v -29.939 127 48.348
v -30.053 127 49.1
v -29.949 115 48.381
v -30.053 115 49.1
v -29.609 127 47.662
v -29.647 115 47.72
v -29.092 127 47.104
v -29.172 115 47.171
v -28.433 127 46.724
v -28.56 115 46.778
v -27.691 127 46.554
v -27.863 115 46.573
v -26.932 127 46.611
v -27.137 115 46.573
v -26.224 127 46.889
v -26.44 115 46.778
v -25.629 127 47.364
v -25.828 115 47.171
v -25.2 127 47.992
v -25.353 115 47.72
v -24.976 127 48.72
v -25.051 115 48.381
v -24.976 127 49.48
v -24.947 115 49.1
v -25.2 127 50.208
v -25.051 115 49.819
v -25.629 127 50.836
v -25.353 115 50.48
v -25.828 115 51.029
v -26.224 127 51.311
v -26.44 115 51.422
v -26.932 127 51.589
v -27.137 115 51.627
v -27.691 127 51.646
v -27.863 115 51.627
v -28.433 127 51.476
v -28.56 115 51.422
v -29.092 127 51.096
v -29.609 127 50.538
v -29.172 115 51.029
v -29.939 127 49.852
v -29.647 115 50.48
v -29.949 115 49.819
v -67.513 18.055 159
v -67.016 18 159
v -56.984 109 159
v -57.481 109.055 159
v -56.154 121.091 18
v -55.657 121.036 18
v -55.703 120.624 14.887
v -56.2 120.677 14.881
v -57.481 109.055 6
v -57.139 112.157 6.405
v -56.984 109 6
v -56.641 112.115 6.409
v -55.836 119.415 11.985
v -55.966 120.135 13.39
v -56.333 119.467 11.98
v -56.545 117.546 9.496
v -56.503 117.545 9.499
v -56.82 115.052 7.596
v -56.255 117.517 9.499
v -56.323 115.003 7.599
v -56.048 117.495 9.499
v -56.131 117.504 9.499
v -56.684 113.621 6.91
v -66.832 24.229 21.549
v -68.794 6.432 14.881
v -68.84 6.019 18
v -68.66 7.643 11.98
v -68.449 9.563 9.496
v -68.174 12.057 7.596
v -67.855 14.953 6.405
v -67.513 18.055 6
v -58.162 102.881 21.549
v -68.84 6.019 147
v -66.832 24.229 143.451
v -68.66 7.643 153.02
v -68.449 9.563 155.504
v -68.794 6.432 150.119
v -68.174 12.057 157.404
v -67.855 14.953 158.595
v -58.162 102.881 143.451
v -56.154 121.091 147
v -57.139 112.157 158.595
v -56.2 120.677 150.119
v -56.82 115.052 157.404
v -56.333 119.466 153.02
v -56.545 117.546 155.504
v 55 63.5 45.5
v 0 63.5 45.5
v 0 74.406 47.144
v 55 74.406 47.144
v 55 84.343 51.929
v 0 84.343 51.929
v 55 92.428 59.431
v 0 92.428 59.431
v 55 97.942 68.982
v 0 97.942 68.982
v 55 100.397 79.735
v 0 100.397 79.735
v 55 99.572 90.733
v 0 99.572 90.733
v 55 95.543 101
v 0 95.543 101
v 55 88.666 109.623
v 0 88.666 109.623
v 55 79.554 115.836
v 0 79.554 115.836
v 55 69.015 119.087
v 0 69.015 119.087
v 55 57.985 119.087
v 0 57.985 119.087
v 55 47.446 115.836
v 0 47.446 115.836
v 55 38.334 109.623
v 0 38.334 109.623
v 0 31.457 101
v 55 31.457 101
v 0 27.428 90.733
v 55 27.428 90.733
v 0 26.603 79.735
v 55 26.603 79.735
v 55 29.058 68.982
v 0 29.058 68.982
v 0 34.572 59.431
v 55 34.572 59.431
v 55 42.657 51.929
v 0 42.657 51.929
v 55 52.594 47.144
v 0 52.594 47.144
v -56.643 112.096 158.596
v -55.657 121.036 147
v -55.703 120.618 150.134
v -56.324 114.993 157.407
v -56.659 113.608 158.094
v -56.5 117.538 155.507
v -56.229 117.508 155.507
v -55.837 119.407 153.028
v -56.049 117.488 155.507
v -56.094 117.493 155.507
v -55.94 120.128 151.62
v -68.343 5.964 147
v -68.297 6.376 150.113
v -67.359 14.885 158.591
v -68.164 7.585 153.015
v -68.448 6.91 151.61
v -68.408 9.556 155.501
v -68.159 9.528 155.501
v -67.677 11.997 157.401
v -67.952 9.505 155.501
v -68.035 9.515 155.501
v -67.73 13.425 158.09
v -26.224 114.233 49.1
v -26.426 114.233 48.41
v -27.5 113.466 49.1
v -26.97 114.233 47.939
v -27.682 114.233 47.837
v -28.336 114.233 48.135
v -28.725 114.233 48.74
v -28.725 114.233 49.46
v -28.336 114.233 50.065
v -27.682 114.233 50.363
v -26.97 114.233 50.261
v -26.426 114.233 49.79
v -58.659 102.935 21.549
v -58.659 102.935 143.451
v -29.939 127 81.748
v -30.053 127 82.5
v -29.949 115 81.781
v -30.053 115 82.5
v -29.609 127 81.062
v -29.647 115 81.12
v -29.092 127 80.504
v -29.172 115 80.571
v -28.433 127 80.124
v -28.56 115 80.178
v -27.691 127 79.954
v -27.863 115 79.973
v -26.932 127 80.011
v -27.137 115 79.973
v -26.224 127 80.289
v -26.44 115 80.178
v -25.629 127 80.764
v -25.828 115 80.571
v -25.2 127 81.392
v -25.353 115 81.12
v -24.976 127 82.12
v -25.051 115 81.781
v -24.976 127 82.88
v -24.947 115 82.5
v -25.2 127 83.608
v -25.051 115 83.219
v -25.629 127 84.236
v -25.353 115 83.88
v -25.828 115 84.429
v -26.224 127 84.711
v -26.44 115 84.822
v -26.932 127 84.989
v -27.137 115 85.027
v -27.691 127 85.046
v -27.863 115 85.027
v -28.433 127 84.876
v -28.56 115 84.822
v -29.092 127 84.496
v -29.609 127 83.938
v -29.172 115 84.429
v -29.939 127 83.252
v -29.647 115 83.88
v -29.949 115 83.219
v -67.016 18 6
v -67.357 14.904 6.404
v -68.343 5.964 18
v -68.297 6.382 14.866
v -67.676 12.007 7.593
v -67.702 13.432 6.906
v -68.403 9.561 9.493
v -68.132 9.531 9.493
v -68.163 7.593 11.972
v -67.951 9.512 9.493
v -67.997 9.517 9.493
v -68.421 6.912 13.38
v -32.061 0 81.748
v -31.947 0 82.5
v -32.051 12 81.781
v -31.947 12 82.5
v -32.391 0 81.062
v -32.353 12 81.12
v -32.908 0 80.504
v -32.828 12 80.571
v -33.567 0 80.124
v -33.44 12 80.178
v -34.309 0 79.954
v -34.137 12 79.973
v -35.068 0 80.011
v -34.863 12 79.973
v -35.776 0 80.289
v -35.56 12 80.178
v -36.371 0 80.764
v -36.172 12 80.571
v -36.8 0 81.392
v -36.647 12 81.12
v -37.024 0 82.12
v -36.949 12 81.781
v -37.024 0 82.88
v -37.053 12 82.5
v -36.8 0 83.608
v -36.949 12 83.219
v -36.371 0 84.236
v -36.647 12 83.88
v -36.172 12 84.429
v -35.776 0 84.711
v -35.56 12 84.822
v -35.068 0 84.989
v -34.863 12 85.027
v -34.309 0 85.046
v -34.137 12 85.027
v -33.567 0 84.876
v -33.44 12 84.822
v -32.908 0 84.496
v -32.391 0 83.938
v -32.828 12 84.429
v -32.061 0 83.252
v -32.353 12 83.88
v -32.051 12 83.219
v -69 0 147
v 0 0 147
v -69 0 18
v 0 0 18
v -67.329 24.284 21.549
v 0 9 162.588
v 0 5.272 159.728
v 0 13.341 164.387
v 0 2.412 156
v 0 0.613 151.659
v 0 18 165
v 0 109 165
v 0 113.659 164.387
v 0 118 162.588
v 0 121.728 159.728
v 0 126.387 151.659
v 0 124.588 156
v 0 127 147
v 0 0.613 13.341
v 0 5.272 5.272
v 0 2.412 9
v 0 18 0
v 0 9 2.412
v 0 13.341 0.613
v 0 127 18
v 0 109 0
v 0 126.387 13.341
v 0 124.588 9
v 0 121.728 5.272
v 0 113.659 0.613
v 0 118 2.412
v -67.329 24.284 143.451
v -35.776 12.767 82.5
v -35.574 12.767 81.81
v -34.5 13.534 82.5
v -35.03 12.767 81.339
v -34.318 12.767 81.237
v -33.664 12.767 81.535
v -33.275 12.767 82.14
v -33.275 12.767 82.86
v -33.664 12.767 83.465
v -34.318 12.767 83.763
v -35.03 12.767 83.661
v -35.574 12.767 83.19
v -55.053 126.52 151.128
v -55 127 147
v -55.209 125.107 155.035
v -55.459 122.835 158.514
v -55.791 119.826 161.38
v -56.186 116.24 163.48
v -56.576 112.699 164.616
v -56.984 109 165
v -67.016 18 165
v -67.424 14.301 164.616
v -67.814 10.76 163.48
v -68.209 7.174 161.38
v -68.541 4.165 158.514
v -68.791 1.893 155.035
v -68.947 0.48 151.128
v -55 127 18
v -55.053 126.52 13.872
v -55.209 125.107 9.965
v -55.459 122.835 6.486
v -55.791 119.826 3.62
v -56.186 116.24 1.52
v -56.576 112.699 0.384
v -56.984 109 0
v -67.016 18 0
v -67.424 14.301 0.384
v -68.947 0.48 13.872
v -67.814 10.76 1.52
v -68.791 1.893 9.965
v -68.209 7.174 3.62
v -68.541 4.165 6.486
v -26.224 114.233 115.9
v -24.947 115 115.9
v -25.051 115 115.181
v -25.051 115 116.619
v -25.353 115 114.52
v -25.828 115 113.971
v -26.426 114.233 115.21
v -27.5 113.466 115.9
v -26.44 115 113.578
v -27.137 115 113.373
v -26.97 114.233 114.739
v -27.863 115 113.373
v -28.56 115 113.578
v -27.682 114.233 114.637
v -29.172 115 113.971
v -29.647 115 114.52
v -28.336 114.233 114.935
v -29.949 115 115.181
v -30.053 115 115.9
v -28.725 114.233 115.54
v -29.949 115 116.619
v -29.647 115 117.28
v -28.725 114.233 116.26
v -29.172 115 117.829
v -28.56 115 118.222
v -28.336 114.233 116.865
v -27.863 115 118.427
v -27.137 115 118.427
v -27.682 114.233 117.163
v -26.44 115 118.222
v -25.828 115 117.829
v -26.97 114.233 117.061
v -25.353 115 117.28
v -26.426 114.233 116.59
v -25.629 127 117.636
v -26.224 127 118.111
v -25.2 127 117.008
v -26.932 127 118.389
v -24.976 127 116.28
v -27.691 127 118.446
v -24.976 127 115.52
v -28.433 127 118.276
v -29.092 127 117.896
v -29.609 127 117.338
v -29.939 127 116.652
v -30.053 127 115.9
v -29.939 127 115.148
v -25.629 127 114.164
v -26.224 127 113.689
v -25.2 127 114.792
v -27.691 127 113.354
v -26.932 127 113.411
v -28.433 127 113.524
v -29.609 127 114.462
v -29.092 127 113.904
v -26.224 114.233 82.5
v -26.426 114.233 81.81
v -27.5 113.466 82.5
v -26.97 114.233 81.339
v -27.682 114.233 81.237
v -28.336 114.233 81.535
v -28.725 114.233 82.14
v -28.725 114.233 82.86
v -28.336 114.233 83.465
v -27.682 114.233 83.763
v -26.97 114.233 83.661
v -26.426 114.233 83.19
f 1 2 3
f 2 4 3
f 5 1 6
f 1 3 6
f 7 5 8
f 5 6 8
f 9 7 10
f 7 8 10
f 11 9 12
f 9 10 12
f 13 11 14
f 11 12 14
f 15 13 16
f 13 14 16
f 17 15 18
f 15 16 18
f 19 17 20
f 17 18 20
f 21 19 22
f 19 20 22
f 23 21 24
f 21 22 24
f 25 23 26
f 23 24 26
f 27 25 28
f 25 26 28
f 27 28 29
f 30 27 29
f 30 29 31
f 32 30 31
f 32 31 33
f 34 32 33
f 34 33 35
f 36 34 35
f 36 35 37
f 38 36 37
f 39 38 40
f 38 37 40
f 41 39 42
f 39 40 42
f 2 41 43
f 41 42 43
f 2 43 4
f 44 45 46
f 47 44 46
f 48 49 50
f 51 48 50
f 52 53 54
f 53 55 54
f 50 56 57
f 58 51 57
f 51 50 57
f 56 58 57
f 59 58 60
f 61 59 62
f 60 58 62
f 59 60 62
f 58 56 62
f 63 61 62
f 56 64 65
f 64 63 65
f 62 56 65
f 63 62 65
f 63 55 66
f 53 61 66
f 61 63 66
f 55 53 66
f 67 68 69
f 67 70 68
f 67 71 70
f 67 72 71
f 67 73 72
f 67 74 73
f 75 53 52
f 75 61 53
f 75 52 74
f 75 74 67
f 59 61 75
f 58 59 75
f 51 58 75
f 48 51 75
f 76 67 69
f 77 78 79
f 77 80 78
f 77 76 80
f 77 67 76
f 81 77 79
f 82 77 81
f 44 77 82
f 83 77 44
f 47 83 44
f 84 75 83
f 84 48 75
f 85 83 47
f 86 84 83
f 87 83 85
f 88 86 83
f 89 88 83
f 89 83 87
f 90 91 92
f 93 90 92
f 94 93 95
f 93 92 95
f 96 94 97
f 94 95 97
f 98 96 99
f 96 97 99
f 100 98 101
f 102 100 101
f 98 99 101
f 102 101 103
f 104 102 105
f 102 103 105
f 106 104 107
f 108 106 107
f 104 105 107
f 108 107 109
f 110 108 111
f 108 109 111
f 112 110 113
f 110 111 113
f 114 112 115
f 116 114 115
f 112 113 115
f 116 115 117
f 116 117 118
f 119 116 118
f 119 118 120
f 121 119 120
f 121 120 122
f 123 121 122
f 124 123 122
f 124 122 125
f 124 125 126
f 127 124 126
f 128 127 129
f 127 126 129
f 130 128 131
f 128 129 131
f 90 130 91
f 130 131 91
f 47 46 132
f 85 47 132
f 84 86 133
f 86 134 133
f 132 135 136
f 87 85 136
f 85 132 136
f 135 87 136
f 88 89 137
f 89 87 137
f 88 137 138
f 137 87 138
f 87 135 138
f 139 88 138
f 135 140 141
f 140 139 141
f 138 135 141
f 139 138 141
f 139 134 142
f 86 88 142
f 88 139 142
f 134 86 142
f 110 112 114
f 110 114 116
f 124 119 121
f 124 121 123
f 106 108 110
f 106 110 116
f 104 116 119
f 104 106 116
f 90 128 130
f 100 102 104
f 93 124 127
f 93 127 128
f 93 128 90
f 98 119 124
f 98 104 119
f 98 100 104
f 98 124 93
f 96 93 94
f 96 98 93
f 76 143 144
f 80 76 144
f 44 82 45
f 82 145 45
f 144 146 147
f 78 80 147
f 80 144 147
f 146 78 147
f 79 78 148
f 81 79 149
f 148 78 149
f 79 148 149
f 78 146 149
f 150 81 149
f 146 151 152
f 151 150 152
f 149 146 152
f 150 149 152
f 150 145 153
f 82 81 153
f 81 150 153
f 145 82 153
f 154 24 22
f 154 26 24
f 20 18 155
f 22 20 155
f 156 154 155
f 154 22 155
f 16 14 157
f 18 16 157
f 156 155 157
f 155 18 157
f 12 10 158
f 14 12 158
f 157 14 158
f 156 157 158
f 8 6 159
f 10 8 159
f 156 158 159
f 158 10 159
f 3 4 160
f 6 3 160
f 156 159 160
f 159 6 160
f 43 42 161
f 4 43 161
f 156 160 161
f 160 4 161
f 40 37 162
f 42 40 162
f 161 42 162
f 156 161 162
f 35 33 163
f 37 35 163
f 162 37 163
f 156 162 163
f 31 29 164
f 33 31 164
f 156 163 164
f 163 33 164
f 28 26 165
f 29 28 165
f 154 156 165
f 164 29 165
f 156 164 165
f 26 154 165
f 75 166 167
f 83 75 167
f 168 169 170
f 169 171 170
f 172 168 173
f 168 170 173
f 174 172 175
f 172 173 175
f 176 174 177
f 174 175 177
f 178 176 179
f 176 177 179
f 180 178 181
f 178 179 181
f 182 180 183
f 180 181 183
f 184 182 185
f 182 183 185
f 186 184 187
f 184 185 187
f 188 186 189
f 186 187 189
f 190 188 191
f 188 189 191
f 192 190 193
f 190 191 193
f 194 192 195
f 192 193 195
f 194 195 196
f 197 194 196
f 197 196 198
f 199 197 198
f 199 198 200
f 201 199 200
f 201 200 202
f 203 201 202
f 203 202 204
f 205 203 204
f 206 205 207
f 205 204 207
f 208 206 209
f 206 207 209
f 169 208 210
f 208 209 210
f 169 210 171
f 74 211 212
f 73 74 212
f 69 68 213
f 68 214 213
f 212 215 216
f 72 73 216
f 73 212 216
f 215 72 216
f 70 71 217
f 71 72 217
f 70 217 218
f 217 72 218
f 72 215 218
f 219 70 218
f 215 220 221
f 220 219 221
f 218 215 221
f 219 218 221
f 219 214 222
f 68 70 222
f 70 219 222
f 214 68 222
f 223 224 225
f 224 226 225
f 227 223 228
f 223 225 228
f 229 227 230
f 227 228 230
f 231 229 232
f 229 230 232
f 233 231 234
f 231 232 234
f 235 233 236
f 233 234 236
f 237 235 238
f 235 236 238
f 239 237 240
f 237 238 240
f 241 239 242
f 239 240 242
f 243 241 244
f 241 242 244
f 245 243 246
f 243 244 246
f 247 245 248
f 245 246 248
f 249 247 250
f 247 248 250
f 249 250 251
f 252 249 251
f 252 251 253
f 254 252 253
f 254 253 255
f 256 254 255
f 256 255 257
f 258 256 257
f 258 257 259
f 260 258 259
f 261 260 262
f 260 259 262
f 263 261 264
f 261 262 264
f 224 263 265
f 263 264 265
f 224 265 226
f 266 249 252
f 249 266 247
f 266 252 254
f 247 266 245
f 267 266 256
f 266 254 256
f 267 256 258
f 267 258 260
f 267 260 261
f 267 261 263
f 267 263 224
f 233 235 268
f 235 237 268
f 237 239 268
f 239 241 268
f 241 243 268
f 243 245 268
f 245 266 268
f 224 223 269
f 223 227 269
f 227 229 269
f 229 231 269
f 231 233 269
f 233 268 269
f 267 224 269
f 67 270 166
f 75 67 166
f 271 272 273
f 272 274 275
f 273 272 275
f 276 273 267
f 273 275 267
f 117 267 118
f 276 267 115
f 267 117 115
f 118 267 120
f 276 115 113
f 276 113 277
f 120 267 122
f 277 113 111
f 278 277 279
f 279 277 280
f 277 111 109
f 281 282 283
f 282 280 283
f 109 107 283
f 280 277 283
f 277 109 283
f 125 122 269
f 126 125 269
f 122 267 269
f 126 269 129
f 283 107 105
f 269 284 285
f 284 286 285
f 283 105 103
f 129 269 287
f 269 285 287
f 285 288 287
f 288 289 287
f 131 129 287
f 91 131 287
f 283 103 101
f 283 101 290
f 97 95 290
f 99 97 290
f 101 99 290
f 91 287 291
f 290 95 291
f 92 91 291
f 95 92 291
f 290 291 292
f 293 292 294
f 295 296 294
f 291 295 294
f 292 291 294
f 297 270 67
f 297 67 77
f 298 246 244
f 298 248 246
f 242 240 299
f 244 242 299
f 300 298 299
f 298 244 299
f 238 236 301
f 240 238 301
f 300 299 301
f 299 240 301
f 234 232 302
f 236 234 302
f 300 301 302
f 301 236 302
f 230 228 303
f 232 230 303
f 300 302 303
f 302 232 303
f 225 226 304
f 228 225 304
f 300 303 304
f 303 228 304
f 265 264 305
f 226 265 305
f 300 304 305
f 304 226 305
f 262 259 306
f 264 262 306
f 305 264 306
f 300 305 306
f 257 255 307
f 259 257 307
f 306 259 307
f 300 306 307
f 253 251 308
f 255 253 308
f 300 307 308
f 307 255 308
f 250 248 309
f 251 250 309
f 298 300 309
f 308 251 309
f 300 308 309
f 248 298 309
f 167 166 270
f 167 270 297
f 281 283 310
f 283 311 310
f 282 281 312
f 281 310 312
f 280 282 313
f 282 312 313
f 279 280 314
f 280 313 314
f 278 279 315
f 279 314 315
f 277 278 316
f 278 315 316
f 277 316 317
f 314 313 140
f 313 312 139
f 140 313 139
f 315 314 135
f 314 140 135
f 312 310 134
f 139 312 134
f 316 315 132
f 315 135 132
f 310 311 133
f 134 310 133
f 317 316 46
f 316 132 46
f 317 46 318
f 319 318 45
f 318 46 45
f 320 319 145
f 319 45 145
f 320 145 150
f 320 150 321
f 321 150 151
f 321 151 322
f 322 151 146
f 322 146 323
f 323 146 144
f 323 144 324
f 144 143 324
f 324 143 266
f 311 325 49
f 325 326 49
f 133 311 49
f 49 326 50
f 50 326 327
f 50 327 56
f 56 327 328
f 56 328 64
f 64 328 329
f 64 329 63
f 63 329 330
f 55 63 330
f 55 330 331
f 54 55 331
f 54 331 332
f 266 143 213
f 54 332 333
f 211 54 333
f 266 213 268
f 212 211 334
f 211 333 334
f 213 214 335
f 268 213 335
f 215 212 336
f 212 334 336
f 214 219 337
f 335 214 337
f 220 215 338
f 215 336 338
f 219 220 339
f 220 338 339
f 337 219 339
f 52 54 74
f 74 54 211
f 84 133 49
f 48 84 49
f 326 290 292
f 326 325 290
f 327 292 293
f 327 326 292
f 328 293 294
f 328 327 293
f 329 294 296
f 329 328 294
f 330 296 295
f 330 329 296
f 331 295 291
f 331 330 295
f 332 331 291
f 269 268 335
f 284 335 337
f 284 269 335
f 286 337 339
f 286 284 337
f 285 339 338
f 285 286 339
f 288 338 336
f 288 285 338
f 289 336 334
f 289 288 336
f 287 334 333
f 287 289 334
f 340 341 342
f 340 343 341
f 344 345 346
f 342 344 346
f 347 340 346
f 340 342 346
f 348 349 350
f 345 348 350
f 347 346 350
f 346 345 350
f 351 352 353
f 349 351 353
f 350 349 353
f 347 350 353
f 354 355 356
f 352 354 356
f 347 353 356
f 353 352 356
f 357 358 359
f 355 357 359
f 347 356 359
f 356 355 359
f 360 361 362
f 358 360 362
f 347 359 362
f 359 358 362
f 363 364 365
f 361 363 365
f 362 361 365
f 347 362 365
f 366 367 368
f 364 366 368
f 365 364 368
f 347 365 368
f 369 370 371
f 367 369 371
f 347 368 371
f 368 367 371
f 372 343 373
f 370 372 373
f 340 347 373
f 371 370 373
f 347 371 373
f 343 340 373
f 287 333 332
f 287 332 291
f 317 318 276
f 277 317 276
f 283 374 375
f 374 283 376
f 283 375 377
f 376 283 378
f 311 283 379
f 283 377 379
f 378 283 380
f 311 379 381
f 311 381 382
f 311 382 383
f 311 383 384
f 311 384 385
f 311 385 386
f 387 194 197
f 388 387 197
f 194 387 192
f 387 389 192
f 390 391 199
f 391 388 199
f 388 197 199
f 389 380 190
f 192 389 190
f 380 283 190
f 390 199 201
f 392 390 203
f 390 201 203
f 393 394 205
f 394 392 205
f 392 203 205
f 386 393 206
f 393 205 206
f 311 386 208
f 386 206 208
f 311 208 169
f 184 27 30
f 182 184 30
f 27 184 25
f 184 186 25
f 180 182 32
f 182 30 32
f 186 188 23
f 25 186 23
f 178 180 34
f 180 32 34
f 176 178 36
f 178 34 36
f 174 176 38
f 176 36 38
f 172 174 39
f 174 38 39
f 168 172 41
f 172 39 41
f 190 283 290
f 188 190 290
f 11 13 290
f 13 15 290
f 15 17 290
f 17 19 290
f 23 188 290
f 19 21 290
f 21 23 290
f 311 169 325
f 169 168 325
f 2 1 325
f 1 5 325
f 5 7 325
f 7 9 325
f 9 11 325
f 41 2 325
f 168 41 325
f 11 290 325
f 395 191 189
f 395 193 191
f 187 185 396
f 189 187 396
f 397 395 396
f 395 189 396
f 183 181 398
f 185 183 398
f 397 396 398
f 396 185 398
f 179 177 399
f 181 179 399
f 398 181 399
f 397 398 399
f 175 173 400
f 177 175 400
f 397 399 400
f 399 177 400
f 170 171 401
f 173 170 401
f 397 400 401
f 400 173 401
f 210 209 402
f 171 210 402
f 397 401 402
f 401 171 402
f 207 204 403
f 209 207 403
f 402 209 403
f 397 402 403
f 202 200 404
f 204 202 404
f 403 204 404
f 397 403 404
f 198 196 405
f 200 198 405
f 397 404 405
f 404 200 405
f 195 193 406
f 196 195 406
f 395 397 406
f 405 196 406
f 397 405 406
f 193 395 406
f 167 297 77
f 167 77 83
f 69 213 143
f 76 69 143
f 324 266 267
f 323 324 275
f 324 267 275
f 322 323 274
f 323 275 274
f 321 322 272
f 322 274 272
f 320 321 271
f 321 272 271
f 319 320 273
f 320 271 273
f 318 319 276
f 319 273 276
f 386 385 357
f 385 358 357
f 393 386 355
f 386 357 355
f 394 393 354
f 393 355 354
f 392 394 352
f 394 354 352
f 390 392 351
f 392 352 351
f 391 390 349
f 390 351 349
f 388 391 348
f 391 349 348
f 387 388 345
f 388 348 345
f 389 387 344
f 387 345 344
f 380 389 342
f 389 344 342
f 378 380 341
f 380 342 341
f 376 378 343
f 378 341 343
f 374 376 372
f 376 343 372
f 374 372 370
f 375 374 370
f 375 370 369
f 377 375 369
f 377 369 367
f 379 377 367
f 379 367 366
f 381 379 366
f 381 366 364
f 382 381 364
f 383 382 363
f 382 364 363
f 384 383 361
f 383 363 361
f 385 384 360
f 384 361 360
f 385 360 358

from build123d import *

# Parameters (mm, degrees)
EXTRUDE_1_DEPTH           = 165
FILLET_1_R                = 18
SKETCH_2_R                = 37
EXTRUDE_2_DEPTH           = 55
HOLE_WIZARD_1_4_201_D     = 5.1054
HOLE_WIZARD_1_4_201_DEPTH = 12
HOLE_WIZARD_1_4_201_TIP   = 1.533816902
HOLE_WIZARD_1_4_202_D     = 5.1054
HOLE_WIZARD_1_4_202_DEPTH = 12
HOLE_WIZARD_1_4_202_TIP   = 1.533816902
EXTRUDE_3_DEPTH           = 1
SKETCH_10_OUTSIDE_W       = 215.504
SKETCH_10_OUTSIDE_H       = 190.363
SKETCH_10_OUTSIDE_W_2     = 121.90164915
SKETCH_10_OUTSIDE_H_2     = 79.127933184
CUT_EXTRUDE_1_DEPTH       = 0.5


with BuildPart() as part:
    # Эскиз1 → Бобышка-Вытянуть1 (new body)
    with BuildSketch(Plane.XY):
        Polygon((0, 0), (0, 127), (-55, 127), (-69, 0), align=None)
    extrude(amount=EXTRUDE_1_DEPTH)

    # Скругление1
    fillet_1_edges = [part.edges().sort_by_distance(p)[0] for p in [
        (-27.5, 127, 165),
        (-34.5, 0, 165),
        (-27.5, 127, 0),
        (-34.5, 0, 0),
    ]]
    fillet(fillet_1_edges, radius=FILLET_1_R)

    # Эскиз2 → Бобышка-Вытянуть2 (add)
    with BuildSketch(Plane(origin=(0, 0, 0), x_dir=(0, 0, -1), z_dir=(1, 0, 0))):
        with Locations((-82.5, 63.5)):
            Circle(SKETCH_2_R)
    extrude(amount=EXTRUDE_2_DEPTH)

    # Отверстие обработанное метчиком 1/4-201
    with Locations(Plane(origin=(0, 127, 0), x_dir=(1, 0, 0), z_dir=(0, 1, 0))):
        with Locations((-27.5, -49.1), (-27.5, -82.5), (-27.5, -115.9)):
            Hole(HOLE_WIZARD_1_4_201_D / 2, depth=HOLE_WIZARD_1_4_201_DEPTH)
            with Locations((0, 0, -(HOLE_WIZARD_1_4_201_DEPTH + HOLE_WIZARD_1_4_201_TIP / 2))):  # 118° drill point
                Cone(0, HOLE_WIZARD_1_4_201_D / 2, HOLE_WIZARD_1_4_201_TIP, mode=Mode.SUBTRACT)

    # Отверстие обработанное метчиком 1/4-202
    with Locations(Plane(origin=(0, 0, 0), x_dir=(-1, 0, 0), z_dir=(0, -1, 0))):
        with Locations((34.5, -82.5)):
            Hole(HOLE_WIZARD_1_4_202_D / 2, depth=HOLE_WIZARD_1_4_202_DEPTH)
            with Locations((0, 0, -(HOLE_WIZARD_1_4_202_DEPTH + HOLE_WIZARD_1_4_202_TIP / 2))):  # 118° drill point
                Cone(0, HOLE_WIZARD_1_4_202_D / 2, HOLE_WIZARD_1_4_202_TIP, mode=Mode.SUBTRACT)

    # Эскиз9 → Бобышка-Вытянуть3 (add)
    with BuildSketch(Plane(origin=(-68.171577335, 7.514977029, 0), x_dir=(0, 0, 1), z_dir=(-0.99397881, 0.109572467, 0))):
        with BuildLine():
            Line((18, -1.560500239), (147, -1.560500239))
            add(Edge.make_bspline(
                [(147, -1.560500239), (147.795969048, -1.560500239), (148.578437938, -1.48137479), (149.732739087, -1.248968925), (150.114248167, -1.152405098), (150.870602957, -0.920222923), (151.246130664, -0.784060546), (152.337830508, -0.325667383), (153.027835256, 0.048140187), (154.006731596, 0.710119453), (154.325036907, 0.948994101), (154.935136946, 1.45617868), (155.225430555, 1.722967352), (156.053427969, 2.561683199), (156.548653408, 3.171597982), (157.20432669, 4.164420075), (157.407043585, 4.507004661), (157.774884438, 5.203781035), (158.107288123, 5.915340648), (158.369821072, 6.656048071), (158.596915662, 7.41153923), (158.6930429, 7.79849924), (158.923007799, 8.965817399), (159, 9.752769129), (159, 10.548537722)],
                knots=[0, 0, 0, 0, 0.125, 0.125, 0.1875, 0.1875, 0.25, 0.25, 0.375, 0.375, 0.4375, 0.4375, 0.5, 0.5, 0.625, 0.625, 0.6875, 0.6875, 0.75, 0.8125, 0.8125, 0.875, 0.875, 1, 1, 1, 1], degree=3))
            Line((159, 10.548537722), (159, 102.099785192))
            add(Edge.make_bspline(
                [(159, 102.099785192), (159, 102.89567677), (158.92299313, 103.678477169), (158.69658927, 104.833825846), (158.602503189, 105.215776987), (158.376242963, 105.973204292), (158.243333402, 106.350026622), (157.795055135, 107.447066101), (157.429092547, 108.141223603), (156.564023929, 109.455731539), (156.059486079, 110.079699577), (154.955465788, 111.199609881), (154.352820703, 111.702413635), (153.371115524, 112.368877293), (153.029785995, 112.576618568), (152.335786173, 112.953165195), (151.627066488, 113.293348749), (150.889392409, 113.562005098), (150.137062243, 113.794455923), (149.752332485, 113.89282261), (148.583675335, 114.129662505), (147.796097323, 114.208823153), (147, 114.208823153)],
                knots=[0, 0, 0, 0, 0.125, 0.125, 0.1875, 0.1875, 0.25, 0.25, 0.375, 0.375, 0.5, 0.5, 0.625, 0.625, 0.6875, 0.6875, 0.75, 0.8125, 0.8125, 0.875, 0.875, 1, 1, 1, 1], degree=3))
            Line((147, 114.208823153), (18, 114.208823153))
            add(Edge.make_bspline(
                [(18, 114.208823153), (17.204030952, 114.208823153), (16.421562062, 114.129697705), (15.267260913, 113.897291839), (14.885751833, 113.800728013), (14.129397043, 113.568545837), (13.753869336, 113.43238346), (12.662169492, 112.973990297), (11.972164744, 112.600182727), (10.993268404, 111.938203462), (10.674963093, 111.699328814), (10.064863054, 111.192144234), (9.774569445, 110.925355563), (8.946572031, 110.086639716), (8.451346592, 109.476724932), (7.79567331, 108.48390284), (7.592956415, 108.141318253), (7.225115562, 107.444541879), (6.892711877, 106.732982266), (6.630178928, 105.992274843), (6.403084338, 105.236783685), (6.3069571, 104.849823675), (6.076992201, 103.682505516), (6, 102.895553785), (6, 102.099785192)],
                knots=[0, 0, 0, 0, 0.125, 0.125, 0.1875, 0.1875, 0.25, 0.25, 0.375, 0.375, 0.4375, 0.4375, 0.5, 0.5, 0.625, 0.625, 0.6875, 0.6875, 0.75, 0.8125, 0.8125, 0.875, 0.875, 1, 1, 1, 1], degree=3))
            Line((6, 102.099785192), (6, 10.548537722))
            add(Edge.make_bspline(
                [(6, 10.548537722), (6, 9.752646144), (6.07700687, 8.969845746), (6.30341073, 7.814497069), (6.397496811, 7.432545928), (6.623757037, 6.675118622), (6.756666598, 6.298296292), (7.204944865, 5.201256813), (7.570907453, 4.507099312), (8.435976071, 3.192591376), (8.940513921, 2.568623338), (10.044534212, 1.448713034), (10.647179297, 0.945909279), (11.628884476, 0.279445622), (11.970214005, 0.071704346), (12.664213827, -0.30484228), (13.372933512, -0.645025835), (14.110607591, -0.913682184), (14.862937757, -1.146133008), (15.247667515, -1.244499696), (16.416324665, -1.48133959), (17.203902677, -1.560500239), (18, -1.560500239)],
                knots=[0, 0, 0, 0, 0.125, 0.125, 0.1875, 0.1875, 0.25, 0.25, 0.375, 0.375, 0.5, 0.5, 0.625, 0.625, 0.6875, 0.6875, 0.75, 0.8125, 0.8125, 0.875, 0.875, 1, 1, 1, 1], degree=3))
        make_face()
    extrude(amount=EXTRUDE_3_DEPTH)

    # Эскиз10 outside → Вырез-Вытянуть1 (cut)
    with BuildSketch(Plane(origin=(-69.165556145, 7.624549496, 0), x_dir=(0, 0, 1), z_dir=(-0.99397881, 0.109572467, 0))):
        with Locations((82.5, 62.3325)):
            Rectangle(SKETCH_10_OUTSIDE_W, SKETCH_10_OUTSIDE_H)
        with Locations((82.5, 56.324161457)):
            Rectangle(SKETCH_10_OUTSIDE_W_2, SKETCH_10_OUTSIDE_H_2, mode=Mode.SUBTRACT)
    extrude(amount=-CUT_EXTRUDE_1_DEPTH, mode=Mode.SUBTRACT)


solid = part.part
